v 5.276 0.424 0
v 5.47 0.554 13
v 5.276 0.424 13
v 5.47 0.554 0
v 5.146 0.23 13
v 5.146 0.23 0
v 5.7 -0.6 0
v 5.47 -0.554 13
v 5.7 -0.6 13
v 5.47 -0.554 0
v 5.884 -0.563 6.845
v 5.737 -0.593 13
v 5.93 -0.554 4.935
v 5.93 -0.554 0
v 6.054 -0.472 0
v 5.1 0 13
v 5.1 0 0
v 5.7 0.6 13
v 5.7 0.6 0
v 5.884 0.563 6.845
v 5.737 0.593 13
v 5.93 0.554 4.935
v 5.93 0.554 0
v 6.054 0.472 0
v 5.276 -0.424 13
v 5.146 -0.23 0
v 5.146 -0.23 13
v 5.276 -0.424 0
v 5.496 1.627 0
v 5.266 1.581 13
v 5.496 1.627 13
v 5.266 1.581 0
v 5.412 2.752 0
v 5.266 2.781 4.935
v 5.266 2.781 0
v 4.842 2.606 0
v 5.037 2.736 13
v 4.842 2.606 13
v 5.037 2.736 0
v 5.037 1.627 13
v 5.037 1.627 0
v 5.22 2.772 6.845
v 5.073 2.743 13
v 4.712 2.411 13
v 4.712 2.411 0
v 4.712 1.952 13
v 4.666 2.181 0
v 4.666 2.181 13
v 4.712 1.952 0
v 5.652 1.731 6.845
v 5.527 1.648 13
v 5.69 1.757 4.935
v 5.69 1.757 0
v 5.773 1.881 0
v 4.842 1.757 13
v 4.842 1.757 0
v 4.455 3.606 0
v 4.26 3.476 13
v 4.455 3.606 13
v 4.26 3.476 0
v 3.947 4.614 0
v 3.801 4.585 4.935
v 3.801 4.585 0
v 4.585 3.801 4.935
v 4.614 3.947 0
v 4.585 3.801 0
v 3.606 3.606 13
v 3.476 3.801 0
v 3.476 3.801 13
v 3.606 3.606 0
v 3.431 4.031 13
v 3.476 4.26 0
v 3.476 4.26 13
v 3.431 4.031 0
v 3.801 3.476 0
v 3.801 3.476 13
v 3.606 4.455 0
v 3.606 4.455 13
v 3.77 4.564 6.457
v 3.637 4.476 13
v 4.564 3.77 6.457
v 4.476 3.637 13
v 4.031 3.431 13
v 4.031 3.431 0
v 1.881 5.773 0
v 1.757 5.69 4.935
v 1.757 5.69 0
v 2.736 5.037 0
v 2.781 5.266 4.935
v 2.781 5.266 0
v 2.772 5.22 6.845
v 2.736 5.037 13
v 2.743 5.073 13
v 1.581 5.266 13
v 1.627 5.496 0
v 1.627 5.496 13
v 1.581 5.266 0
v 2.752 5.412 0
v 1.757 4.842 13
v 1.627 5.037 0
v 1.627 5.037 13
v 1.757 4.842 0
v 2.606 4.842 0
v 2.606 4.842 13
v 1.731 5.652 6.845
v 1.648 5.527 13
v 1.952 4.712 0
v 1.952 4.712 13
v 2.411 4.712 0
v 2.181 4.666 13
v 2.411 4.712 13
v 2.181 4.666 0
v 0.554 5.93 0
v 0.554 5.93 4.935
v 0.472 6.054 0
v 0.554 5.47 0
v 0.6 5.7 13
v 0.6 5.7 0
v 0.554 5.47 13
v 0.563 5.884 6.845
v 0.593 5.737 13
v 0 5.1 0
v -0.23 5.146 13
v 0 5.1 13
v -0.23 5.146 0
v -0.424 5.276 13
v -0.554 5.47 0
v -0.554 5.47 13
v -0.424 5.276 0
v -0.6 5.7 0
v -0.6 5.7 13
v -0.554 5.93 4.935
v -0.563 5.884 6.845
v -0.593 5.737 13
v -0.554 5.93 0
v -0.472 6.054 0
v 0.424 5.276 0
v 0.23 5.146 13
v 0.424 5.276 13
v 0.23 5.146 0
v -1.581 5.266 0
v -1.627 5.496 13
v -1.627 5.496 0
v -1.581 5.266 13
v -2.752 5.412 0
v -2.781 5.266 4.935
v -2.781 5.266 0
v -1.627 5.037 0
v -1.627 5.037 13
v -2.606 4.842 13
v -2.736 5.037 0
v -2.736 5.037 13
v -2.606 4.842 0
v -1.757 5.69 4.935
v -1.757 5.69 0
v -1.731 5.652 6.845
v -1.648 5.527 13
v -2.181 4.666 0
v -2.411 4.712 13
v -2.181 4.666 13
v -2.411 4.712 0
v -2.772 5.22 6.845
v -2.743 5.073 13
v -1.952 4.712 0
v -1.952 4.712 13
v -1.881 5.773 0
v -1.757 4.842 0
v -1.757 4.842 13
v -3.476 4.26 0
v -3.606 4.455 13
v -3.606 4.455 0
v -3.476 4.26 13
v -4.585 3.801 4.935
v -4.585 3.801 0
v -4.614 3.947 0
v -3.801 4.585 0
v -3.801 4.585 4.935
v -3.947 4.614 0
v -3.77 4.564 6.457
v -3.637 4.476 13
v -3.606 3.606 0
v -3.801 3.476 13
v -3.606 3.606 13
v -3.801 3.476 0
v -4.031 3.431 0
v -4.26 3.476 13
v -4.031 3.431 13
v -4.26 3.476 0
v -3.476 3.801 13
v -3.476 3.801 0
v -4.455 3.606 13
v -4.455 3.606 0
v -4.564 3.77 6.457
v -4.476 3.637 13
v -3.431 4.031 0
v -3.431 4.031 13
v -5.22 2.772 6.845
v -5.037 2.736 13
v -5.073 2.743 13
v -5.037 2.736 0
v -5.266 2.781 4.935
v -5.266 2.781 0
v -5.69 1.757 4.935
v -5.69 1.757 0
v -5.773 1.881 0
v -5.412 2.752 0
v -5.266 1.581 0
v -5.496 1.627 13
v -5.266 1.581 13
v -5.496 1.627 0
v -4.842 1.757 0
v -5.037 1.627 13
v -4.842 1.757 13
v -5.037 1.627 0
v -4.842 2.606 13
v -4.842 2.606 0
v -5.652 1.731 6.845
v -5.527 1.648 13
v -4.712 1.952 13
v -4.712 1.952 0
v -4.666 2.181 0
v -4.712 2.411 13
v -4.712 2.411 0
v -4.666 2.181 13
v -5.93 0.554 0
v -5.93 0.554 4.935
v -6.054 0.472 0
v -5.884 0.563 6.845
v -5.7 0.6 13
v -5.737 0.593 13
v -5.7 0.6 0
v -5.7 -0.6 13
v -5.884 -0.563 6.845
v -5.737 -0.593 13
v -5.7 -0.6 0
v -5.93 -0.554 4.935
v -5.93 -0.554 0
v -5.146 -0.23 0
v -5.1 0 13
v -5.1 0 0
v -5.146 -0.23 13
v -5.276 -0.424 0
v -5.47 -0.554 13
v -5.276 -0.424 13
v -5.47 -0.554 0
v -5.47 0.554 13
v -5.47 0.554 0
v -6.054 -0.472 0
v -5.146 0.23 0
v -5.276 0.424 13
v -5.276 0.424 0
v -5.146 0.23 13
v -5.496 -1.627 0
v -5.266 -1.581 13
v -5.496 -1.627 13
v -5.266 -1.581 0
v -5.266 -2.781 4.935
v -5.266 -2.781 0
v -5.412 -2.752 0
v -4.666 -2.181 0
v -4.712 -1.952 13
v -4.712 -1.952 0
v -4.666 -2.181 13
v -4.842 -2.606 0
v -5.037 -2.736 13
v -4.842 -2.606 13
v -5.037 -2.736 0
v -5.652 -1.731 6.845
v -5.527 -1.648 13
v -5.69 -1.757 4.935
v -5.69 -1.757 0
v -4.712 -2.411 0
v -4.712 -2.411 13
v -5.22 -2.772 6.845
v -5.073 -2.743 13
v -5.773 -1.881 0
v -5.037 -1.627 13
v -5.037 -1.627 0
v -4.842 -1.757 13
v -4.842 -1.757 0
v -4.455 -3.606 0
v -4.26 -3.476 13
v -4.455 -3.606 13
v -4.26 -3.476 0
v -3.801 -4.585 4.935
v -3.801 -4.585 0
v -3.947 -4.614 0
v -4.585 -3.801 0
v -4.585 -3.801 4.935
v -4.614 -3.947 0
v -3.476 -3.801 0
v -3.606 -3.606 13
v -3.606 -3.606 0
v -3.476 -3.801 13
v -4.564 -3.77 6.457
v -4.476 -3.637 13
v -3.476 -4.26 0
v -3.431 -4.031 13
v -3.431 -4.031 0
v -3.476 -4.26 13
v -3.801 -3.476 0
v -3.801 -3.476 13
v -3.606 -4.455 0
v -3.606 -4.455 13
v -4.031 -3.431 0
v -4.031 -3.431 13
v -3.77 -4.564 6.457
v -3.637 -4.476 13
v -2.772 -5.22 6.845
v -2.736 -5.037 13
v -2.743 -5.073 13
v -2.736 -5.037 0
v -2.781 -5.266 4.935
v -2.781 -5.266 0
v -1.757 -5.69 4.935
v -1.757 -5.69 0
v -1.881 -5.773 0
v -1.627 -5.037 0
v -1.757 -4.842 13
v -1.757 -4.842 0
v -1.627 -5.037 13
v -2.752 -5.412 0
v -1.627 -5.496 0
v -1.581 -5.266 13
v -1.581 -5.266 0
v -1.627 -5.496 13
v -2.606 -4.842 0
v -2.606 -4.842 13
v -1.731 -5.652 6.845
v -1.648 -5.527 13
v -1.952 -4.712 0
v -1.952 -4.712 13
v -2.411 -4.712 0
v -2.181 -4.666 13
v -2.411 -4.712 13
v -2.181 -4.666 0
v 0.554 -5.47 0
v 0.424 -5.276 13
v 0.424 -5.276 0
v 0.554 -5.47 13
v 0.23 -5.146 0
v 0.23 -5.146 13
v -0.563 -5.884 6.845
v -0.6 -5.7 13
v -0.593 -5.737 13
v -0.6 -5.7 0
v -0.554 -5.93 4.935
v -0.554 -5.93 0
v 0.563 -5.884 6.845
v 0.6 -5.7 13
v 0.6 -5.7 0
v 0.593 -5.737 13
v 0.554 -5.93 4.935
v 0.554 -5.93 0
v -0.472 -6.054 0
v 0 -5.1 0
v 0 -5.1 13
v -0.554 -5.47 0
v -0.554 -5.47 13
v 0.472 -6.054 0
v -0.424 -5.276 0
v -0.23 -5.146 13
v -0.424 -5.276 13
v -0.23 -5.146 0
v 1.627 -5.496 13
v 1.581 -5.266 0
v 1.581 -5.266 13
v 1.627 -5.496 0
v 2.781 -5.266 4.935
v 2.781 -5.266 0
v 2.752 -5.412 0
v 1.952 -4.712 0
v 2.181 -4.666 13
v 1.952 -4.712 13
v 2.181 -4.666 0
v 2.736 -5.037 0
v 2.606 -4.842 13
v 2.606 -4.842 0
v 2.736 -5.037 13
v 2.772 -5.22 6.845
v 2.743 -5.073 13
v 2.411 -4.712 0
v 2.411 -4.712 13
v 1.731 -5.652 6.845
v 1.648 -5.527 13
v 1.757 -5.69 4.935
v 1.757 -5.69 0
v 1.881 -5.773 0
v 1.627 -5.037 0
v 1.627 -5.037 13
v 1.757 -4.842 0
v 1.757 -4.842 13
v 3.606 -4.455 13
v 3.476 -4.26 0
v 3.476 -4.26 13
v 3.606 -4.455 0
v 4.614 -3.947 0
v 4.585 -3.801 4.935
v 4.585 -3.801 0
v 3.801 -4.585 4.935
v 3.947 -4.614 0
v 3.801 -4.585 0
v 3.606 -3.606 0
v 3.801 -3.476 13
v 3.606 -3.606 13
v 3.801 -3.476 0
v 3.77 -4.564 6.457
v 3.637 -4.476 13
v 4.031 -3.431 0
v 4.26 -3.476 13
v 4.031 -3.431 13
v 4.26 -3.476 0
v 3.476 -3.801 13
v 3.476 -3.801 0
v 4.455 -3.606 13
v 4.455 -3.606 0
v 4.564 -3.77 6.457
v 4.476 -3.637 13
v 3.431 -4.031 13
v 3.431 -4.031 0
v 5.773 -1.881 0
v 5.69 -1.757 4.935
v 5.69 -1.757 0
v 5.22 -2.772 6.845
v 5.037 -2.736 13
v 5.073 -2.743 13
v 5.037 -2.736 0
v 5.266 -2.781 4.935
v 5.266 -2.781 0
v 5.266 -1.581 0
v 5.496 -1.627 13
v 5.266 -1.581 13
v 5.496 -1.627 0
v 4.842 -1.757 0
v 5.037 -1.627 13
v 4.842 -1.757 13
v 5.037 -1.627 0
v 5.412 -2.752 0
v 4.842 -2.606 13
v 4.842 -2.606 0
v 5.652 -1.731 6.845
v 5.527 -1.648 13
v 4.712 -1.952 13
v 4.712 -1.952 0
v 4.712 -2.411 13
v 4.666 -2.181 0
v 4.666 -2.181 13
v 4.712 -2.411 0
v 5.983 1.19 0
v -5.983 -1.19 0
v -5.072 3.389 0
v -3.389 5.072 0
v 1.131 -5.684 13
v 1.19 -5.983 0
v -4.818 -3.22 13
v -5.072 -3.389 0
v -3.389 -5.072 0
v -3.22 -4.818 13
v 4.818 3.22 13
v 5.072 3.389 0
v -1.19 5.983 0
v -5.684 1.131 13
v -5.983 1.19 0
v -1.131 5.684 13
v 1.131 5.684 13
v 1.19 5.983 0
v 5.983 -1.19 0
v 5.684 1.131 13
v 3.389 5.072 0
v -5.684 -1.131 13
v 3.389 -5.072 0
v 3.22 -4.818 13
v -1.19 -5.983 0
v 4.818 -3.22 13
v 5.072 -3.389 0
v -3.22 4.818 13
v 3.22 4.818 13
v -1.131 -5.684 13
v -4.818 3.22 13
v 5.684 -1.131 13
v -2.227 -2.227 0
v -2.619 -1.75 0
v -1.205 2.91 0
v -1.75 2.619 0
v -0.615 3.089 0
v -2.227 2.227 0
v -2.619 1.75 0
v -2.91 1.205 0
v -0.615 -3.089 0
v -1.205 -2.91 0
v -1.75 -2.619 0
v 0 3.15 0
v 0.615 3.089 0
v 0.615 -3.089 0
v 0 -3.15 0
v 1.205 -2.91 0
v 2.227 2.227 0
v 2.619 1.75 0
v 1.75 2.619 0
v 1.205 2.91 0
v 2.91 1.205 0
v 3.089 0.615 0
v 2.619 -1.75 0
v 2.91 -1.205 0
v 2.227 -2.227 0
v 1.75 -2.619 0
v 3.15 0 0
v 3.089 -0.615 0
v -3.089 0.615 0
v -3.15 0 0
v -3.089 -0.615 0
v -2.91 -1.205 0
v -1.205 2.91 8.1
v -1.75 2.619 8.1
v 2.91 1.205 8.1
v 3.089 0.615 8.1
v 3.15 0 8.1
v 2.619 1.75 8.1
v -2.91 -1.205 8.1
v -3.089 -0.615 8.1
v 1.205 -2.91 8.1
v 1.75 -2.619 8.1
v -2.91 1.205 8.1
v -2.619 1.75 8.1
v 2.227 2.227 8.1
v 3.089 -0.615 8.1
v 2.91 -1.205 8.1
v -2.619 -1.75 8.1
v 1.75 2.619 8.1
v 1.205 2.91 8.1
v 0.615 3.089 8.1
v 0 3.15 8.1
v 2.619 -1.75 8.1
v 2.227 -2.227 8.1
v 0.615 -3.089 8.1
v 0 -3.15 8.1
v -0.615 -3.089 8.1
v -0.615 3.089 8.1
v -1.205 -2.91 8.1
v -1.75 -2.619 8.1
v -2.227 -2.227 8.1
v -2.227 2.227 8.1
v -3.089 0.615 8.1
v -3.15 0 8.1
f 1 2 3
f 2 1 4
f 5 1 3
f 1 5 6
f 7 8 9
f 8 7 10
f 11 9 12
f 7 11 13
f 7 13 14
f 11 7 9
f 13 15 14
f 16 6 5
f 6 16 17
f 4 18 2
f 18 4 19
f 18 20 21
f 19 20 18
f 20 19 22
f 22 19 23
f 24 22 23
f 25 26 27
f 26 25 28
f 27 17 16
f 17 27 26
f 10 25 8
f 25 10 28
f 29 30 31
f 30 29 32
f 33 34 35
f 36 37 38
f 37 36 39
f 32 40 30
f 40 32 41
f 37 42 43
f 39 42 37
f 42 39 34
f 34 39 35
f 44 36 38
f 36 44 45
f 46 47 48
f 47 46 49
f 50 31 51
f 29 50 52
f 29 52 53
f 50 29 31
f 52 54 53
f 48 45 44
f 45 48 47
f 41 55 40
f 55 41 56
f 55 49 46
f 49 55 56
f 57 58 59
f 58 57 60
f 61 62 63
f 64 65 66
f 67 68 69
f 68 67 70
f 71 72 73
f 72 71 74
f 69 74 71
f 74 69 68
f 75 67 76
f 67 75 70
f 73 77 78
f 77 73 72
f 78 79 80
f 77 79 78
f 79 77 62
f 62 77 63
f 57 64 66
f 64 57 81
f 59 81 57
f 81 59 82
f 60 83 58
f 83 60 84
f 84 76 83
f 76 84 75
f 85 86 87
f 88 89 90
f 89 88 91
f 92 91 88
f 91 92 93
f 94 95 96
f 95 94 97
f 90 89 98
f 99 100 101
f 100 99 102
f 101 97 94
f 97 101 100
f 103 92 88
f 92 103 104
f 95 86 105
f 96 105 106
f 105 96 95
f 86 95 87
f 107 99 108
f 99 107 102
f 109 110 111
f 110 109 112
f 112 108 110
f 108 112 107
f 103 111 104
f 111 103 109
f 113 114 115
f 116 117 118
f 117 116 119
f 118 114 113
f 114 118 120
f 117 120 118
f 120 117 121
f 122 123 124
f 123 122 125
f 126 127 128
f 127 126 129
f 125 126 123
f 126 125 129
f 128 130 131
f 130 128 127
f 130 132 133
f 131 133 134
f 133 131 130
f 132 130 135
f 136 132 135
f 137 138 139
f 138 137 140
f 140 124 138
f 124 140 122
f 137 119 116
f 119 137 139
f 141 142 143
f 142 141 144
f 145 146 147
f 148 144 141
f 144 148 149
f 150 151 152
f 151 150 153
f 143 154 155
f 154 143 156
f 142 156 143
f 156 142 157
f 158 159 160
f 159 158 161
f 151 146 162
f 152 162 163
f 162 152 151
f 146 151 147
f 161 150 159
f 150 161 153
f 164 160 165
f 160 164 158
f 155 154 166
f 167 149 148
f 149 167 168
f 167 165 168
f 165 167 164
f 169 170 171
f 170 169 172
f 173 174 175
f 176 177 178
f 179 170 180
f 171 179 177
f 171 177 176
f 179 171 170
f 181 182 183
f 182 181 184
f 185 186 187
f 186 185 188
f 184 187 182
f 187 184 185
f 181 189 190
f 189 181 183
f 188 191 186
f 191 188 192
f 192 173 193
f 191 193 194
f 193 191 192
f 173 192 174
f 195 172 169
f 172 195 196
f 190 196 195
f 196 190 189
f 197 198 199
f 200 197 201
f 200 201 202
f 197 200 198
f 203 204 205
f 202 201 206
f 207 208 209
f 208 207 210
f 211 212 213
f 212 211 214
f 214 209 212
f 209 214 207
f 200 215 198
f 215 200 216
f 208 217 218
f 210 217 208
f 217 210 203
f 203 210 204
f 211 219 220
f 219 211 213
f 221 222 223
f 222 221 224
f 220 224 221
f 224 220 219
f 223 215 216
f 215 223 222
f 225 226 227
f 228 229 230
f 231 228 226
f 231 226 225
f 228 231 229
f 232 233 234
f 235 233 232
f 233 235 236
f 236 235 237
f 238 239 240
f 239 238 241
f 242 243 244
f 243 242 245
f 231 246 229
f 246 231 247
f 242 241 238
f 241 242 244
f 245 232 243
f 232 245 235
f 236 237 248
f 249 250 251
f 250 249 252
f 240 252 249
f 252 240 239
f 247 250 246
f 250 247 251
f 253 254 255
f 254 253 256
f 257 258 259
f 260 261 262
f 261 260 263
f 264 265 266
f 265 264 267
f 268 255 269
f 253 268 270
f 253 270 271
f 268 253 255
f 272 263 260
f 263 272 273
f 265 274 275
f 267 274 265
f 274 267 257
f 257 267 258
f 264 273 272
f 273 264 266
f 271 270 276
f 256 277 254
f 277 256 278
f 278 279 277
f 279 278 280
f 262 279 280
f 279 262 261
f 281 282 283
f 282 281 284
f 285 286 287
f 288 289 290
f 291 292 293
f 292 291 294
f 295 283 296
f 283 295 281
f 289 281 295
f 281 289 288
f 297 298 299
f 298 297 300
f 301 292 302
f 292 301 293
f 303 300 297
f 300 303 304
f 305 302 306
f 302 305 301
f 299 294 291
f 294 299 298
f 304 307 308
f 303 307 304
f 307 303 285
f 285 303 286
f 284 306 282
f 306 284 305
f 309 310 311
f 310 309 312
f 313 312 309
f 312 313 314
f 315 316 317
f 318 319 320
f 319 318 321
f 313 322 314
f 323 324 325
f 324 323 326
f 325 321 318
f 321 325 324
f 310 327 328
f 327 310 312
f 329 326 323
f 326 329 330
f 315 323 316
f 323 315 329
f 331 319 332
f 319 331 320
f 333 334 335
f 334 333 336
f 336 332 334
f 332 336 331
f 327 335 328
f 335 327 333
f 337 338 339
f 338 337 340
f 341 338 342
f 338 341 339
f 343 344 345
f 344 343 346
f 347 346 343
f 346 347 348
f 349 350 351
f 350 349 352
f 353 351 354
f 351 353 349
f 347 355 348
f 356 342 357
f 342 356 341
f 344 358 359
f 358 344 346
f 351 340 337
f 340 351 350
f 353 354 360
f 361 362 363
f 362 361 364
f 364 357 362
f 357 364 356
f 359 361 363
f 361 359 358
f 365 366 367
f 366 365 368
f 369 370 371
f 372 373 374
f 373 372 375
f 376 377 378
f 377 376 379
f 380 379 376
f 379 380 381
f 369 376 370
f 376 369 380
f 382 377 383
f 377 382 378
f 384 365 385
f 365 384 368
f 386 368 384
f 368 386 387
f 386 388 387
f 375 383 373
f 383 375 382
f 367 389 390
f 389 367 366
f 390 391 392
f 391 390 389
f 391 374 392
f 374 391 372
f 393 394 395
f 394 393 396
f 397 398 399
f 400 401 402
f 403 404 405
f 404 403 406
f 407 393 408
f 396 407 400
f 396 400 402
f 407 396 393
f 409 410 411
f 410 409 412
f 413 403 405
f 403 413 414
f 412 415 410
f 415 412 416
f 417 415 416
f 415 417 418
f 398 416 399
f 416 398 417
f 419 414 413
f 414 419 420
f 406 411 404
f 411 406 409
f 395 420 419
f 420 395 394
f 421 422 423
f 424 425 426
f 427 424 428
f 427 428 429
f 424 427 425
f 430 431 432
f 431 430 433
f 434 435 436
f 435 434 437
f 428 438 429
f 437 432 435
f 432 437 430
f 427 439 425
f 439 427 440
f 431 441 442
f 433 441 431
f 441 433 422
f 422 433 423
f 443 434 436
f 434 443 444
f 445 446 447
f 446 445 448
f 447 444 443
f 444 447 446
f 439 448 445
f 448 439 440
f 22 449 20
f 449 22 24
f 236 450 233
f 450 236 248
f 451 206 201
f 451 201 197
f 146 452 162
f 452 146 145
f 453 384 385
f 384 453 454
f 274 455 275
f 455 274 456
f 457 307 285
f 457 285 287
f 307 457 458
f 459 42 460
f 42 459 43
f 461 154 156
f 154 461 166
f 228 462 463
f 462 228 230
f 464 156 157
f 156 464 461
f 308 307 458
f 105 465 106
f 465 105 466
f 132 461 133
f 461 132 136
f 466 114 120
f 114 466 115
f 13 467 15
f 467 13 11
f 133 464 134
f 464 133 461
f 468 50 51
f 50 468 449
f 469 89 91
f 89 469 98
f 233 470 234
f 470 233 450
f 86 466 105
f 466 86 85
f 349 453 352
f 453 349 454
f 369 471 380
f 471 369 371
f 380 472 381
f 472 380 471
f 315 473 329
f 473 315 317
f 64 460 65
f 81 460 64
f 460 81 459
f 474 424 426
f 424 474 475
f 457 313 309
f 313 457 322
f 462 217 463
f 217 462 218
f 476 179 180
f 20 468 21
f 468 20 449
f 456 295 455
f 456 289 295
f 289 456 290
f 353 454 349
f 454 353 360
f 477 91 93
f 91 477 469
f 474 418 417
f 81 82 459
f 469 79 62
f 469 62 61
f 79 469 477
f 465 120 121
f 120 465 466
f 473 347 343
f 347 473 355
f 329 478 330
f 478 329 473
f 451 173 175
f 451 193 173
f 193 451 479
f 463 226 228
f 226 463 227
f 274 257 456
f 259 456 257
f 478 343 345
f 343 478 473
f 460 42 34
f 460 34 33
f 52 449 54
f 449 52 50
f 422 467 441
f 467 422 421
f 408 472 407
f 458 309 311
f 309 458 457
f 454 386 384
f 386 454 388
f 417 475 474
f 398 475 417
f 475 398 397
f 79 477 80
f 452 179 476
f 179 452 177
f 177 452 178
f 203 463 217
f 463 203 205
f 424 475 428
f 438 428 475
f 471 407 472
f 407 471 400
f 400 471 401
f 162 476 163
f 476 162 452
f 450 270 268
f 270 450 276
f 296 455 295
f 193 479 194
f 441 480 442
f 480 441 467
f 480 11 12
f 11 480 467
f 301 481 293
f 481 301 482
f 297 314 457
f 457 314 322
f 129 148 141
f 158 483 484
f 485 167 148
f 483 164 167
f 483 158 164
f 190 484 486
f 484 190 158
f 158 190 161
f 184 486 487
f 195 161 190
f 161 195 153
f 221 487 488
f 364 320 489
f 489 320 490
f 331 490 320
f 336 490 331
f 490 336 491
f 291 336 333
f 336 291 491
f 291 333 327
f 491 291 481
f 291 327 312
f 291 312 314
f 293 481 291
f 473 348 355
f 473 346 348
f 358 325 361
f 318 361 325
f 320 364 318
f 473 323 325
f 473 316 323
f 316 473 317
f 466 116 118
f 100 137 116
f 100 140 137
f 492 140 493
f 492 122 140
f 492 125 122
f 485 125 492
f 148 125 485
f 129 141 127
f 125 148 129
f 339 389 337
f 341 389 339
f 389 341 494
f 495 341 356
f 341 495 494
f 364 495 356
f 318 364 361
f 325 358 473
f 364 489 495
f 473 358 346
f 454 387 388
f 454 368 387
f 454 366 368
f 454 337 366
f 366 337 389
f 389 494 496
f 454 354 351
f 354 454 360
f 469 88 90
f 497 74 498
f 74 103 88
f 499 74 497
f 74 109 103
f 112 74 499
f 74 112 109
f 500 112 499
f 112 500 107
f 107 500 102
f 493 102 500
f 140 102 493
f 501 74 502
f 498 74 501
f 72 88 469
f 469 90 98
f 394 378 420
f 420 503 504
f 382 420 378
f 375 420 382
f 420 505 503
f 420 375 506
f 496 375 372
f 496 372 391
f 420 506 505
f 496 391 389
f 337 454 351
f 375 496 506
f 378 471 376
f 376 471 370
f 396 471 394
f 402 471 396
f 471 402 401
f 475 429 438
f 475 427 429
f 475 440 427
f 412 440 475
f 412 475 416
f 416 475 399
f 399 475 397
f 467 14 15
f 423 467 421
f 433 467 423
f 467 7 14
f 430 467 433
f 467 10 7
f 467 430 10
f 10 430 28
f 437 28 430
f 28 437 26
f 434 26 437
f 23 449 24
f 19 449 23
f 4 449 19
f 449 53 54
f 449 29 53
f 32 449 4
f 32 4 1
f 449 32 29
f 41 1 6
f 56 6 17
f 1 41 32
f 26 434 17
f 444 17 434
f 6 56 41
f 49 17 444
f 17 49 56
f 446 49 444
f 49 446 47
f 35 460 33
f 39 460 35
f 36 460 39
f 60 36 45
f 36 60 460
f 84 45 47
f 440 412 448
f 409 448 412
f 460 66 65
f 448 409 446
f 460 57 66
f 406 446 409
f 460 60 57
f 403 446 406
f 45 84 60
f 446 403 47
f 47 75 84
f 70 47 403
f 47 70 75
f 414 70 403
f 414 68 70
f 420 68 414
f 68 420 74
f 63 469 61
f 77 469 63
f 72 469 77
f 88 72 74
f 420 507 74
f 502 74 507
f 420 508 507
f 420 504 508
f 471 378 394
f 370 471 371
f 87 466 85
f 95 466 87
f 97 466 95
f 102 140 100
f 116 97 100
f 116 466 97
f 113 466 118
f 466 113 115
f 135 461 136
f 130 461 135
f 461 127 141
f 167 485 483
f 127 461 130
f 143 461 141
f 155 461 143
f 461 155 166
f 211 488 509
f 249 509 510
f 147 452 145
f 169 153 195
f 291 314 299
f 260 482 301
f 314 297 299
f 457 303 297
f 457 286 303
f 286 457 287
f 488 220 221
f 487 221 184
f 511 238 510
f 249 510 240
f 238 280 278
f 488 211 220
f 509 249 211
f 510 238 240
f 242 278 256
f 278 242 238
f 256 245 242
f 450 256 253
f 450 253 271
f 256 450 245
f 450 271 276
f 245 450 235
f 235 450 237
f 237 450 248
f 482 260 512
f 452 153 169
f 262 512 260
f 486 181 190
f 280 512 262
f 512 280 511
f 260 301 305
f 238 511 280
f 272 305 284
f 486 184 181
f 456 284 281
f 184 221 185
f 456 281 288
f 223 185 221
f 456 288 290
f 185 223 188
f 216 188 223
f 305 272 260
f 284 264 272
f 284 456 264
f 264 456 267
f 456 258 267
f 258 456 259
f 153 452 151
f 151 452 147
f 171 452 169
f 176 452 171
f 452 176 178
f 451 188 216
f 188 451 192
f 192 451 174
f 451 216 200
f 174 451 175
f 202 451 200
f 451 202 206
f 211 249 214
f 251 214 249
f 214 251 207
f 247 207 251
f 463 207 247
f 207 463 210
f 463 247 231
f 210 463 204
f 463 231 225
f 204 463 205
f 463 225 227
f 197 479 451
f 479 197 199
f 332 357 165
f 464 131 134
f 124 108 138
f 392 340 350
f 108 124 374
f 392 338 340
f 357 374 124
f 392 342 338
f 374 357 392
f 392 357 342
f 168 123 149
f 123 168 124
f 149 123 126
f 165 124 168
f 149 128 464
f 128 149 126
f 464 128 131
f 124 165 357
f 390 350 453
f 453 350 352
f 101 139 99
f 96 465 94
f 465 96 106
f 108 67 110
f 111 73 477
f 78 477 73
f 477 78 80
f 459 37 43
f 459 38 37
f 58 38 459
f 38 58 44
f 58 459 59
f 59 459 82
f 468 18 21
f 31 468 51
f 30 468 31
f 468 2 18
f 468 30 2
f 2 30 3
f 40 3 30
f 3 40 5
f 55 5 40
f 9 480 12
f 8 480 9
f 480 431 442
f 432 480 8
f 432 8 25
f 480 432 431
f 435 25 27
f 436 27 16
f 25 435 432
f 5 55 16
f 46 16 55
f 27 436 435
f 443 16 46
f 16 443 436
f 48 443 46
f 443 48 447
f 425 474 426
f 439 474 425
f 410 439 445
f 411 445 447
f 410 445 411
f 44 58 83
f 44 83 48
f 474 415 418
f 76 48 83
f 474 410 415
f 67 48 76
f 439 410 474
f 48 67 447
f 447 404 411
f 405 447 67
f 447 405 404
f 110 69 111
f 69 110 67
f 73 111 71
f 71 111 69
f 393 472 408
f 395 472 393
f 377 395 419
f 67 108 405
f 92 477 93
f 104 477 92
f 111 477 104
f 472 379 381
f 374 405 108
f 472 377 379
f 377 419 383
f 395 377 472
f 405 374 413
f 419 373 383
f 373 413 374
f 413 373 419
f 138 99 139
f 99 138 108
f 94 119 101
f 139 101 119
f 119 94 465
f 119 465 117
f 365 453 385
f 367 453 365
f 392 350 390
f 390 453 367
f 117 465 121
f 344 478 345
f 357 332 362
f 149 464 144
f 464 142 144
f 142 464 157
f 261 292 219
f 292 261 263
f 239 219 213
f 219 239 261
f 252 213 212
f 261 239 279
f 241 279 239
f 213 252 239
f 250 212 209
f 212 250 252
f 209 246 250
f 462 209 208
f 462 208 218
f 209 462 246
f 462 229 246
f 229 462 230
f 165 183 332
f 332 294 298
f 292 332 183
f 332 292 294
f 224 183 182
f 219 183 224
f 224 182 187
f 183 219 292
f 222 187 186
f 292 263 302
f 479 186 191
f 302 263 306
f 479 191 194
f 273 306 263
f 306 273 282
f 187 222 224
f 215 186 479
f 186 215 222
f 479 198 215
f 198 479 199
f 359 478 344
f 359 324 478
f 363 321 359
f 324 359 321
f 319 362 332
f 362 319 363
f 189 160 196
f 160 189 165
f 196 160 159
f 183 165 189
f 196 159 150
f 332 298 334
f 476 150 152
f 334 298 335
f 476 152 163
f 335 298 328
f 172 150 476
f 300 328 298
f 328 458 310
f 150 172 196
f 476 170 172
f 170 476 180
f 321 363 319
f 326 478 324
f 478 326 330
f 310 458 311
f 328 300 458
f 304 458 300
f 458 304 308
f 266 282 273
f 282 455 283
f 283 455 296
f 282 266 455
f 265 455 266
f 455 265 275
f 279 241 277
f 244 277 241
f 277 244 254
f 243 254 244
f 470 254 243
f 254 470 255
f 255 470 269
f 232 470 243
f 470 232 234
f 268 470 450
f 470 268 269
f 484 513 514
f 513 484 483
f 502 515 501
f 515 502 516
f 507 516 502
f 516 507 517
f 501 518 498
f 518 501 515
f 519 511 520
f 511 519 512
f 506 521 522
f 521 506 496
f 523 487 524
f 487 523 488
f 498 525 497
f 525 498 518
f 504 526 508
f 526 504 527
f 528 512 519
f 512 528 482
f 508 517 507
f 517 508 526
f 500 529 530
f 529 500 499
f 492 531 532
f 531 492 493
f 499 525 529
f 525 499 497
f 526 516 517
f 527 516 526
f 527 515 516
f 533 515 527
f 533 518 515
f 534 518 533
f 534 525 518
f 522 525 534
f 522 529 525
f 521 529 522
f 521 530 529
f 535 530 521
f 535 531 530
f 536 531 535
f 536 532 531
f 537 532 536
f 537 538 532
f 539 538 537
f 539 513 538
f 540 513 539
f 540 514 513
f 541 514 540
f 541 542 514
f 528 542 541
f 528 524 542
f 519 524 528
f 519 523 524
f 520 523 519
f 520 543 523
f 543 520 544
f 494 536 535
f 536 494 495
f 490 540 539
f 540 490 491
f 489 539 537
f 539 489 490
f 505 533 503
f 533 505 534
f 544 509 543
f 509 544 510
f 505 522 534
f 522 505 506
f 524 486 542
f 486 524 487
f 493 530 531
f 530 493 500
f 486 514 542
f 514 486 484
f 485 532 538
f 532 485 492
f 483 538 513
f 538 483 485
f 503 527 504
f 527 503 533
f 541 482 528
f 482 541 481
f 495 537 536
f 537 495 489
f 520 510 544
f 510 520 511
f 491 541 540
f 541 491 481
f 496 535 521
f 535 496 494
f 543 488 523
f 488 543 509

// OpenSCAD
// ACCESS KNOB — Elektron Machinedrum Tempo Knob
// Generated via CLI for Studio Knobs
module access_knob_elektron_tempo() {
  outer_d = 12.2;
  height = 13;
  taper = 0.95;
  bore_d = 6;
  slot_h = 8;
  tex_depth = 0.8;
  tex_scale = 1.2;
  tex_count = 16;

  difference() {
    cylinder(h=height, d1=outer_d, d2=outer_d*taper, $fn=32);
    translate([0,0,-0.1]) cylinder(h=slot_h+0.2, d=bore_d + 0.3, $fn=32);
    for(i=[0:tex_count-1]) {
      rotate([0,0,i*(360/tex_count)])
        translate([outer_d/2-tex_depth/2, 0, height/2])
          cylinder(h=height*1.1, d=tex_scale, center=true, $fn=16);
    }
  }
}
access_knob_elektron_tempo();
